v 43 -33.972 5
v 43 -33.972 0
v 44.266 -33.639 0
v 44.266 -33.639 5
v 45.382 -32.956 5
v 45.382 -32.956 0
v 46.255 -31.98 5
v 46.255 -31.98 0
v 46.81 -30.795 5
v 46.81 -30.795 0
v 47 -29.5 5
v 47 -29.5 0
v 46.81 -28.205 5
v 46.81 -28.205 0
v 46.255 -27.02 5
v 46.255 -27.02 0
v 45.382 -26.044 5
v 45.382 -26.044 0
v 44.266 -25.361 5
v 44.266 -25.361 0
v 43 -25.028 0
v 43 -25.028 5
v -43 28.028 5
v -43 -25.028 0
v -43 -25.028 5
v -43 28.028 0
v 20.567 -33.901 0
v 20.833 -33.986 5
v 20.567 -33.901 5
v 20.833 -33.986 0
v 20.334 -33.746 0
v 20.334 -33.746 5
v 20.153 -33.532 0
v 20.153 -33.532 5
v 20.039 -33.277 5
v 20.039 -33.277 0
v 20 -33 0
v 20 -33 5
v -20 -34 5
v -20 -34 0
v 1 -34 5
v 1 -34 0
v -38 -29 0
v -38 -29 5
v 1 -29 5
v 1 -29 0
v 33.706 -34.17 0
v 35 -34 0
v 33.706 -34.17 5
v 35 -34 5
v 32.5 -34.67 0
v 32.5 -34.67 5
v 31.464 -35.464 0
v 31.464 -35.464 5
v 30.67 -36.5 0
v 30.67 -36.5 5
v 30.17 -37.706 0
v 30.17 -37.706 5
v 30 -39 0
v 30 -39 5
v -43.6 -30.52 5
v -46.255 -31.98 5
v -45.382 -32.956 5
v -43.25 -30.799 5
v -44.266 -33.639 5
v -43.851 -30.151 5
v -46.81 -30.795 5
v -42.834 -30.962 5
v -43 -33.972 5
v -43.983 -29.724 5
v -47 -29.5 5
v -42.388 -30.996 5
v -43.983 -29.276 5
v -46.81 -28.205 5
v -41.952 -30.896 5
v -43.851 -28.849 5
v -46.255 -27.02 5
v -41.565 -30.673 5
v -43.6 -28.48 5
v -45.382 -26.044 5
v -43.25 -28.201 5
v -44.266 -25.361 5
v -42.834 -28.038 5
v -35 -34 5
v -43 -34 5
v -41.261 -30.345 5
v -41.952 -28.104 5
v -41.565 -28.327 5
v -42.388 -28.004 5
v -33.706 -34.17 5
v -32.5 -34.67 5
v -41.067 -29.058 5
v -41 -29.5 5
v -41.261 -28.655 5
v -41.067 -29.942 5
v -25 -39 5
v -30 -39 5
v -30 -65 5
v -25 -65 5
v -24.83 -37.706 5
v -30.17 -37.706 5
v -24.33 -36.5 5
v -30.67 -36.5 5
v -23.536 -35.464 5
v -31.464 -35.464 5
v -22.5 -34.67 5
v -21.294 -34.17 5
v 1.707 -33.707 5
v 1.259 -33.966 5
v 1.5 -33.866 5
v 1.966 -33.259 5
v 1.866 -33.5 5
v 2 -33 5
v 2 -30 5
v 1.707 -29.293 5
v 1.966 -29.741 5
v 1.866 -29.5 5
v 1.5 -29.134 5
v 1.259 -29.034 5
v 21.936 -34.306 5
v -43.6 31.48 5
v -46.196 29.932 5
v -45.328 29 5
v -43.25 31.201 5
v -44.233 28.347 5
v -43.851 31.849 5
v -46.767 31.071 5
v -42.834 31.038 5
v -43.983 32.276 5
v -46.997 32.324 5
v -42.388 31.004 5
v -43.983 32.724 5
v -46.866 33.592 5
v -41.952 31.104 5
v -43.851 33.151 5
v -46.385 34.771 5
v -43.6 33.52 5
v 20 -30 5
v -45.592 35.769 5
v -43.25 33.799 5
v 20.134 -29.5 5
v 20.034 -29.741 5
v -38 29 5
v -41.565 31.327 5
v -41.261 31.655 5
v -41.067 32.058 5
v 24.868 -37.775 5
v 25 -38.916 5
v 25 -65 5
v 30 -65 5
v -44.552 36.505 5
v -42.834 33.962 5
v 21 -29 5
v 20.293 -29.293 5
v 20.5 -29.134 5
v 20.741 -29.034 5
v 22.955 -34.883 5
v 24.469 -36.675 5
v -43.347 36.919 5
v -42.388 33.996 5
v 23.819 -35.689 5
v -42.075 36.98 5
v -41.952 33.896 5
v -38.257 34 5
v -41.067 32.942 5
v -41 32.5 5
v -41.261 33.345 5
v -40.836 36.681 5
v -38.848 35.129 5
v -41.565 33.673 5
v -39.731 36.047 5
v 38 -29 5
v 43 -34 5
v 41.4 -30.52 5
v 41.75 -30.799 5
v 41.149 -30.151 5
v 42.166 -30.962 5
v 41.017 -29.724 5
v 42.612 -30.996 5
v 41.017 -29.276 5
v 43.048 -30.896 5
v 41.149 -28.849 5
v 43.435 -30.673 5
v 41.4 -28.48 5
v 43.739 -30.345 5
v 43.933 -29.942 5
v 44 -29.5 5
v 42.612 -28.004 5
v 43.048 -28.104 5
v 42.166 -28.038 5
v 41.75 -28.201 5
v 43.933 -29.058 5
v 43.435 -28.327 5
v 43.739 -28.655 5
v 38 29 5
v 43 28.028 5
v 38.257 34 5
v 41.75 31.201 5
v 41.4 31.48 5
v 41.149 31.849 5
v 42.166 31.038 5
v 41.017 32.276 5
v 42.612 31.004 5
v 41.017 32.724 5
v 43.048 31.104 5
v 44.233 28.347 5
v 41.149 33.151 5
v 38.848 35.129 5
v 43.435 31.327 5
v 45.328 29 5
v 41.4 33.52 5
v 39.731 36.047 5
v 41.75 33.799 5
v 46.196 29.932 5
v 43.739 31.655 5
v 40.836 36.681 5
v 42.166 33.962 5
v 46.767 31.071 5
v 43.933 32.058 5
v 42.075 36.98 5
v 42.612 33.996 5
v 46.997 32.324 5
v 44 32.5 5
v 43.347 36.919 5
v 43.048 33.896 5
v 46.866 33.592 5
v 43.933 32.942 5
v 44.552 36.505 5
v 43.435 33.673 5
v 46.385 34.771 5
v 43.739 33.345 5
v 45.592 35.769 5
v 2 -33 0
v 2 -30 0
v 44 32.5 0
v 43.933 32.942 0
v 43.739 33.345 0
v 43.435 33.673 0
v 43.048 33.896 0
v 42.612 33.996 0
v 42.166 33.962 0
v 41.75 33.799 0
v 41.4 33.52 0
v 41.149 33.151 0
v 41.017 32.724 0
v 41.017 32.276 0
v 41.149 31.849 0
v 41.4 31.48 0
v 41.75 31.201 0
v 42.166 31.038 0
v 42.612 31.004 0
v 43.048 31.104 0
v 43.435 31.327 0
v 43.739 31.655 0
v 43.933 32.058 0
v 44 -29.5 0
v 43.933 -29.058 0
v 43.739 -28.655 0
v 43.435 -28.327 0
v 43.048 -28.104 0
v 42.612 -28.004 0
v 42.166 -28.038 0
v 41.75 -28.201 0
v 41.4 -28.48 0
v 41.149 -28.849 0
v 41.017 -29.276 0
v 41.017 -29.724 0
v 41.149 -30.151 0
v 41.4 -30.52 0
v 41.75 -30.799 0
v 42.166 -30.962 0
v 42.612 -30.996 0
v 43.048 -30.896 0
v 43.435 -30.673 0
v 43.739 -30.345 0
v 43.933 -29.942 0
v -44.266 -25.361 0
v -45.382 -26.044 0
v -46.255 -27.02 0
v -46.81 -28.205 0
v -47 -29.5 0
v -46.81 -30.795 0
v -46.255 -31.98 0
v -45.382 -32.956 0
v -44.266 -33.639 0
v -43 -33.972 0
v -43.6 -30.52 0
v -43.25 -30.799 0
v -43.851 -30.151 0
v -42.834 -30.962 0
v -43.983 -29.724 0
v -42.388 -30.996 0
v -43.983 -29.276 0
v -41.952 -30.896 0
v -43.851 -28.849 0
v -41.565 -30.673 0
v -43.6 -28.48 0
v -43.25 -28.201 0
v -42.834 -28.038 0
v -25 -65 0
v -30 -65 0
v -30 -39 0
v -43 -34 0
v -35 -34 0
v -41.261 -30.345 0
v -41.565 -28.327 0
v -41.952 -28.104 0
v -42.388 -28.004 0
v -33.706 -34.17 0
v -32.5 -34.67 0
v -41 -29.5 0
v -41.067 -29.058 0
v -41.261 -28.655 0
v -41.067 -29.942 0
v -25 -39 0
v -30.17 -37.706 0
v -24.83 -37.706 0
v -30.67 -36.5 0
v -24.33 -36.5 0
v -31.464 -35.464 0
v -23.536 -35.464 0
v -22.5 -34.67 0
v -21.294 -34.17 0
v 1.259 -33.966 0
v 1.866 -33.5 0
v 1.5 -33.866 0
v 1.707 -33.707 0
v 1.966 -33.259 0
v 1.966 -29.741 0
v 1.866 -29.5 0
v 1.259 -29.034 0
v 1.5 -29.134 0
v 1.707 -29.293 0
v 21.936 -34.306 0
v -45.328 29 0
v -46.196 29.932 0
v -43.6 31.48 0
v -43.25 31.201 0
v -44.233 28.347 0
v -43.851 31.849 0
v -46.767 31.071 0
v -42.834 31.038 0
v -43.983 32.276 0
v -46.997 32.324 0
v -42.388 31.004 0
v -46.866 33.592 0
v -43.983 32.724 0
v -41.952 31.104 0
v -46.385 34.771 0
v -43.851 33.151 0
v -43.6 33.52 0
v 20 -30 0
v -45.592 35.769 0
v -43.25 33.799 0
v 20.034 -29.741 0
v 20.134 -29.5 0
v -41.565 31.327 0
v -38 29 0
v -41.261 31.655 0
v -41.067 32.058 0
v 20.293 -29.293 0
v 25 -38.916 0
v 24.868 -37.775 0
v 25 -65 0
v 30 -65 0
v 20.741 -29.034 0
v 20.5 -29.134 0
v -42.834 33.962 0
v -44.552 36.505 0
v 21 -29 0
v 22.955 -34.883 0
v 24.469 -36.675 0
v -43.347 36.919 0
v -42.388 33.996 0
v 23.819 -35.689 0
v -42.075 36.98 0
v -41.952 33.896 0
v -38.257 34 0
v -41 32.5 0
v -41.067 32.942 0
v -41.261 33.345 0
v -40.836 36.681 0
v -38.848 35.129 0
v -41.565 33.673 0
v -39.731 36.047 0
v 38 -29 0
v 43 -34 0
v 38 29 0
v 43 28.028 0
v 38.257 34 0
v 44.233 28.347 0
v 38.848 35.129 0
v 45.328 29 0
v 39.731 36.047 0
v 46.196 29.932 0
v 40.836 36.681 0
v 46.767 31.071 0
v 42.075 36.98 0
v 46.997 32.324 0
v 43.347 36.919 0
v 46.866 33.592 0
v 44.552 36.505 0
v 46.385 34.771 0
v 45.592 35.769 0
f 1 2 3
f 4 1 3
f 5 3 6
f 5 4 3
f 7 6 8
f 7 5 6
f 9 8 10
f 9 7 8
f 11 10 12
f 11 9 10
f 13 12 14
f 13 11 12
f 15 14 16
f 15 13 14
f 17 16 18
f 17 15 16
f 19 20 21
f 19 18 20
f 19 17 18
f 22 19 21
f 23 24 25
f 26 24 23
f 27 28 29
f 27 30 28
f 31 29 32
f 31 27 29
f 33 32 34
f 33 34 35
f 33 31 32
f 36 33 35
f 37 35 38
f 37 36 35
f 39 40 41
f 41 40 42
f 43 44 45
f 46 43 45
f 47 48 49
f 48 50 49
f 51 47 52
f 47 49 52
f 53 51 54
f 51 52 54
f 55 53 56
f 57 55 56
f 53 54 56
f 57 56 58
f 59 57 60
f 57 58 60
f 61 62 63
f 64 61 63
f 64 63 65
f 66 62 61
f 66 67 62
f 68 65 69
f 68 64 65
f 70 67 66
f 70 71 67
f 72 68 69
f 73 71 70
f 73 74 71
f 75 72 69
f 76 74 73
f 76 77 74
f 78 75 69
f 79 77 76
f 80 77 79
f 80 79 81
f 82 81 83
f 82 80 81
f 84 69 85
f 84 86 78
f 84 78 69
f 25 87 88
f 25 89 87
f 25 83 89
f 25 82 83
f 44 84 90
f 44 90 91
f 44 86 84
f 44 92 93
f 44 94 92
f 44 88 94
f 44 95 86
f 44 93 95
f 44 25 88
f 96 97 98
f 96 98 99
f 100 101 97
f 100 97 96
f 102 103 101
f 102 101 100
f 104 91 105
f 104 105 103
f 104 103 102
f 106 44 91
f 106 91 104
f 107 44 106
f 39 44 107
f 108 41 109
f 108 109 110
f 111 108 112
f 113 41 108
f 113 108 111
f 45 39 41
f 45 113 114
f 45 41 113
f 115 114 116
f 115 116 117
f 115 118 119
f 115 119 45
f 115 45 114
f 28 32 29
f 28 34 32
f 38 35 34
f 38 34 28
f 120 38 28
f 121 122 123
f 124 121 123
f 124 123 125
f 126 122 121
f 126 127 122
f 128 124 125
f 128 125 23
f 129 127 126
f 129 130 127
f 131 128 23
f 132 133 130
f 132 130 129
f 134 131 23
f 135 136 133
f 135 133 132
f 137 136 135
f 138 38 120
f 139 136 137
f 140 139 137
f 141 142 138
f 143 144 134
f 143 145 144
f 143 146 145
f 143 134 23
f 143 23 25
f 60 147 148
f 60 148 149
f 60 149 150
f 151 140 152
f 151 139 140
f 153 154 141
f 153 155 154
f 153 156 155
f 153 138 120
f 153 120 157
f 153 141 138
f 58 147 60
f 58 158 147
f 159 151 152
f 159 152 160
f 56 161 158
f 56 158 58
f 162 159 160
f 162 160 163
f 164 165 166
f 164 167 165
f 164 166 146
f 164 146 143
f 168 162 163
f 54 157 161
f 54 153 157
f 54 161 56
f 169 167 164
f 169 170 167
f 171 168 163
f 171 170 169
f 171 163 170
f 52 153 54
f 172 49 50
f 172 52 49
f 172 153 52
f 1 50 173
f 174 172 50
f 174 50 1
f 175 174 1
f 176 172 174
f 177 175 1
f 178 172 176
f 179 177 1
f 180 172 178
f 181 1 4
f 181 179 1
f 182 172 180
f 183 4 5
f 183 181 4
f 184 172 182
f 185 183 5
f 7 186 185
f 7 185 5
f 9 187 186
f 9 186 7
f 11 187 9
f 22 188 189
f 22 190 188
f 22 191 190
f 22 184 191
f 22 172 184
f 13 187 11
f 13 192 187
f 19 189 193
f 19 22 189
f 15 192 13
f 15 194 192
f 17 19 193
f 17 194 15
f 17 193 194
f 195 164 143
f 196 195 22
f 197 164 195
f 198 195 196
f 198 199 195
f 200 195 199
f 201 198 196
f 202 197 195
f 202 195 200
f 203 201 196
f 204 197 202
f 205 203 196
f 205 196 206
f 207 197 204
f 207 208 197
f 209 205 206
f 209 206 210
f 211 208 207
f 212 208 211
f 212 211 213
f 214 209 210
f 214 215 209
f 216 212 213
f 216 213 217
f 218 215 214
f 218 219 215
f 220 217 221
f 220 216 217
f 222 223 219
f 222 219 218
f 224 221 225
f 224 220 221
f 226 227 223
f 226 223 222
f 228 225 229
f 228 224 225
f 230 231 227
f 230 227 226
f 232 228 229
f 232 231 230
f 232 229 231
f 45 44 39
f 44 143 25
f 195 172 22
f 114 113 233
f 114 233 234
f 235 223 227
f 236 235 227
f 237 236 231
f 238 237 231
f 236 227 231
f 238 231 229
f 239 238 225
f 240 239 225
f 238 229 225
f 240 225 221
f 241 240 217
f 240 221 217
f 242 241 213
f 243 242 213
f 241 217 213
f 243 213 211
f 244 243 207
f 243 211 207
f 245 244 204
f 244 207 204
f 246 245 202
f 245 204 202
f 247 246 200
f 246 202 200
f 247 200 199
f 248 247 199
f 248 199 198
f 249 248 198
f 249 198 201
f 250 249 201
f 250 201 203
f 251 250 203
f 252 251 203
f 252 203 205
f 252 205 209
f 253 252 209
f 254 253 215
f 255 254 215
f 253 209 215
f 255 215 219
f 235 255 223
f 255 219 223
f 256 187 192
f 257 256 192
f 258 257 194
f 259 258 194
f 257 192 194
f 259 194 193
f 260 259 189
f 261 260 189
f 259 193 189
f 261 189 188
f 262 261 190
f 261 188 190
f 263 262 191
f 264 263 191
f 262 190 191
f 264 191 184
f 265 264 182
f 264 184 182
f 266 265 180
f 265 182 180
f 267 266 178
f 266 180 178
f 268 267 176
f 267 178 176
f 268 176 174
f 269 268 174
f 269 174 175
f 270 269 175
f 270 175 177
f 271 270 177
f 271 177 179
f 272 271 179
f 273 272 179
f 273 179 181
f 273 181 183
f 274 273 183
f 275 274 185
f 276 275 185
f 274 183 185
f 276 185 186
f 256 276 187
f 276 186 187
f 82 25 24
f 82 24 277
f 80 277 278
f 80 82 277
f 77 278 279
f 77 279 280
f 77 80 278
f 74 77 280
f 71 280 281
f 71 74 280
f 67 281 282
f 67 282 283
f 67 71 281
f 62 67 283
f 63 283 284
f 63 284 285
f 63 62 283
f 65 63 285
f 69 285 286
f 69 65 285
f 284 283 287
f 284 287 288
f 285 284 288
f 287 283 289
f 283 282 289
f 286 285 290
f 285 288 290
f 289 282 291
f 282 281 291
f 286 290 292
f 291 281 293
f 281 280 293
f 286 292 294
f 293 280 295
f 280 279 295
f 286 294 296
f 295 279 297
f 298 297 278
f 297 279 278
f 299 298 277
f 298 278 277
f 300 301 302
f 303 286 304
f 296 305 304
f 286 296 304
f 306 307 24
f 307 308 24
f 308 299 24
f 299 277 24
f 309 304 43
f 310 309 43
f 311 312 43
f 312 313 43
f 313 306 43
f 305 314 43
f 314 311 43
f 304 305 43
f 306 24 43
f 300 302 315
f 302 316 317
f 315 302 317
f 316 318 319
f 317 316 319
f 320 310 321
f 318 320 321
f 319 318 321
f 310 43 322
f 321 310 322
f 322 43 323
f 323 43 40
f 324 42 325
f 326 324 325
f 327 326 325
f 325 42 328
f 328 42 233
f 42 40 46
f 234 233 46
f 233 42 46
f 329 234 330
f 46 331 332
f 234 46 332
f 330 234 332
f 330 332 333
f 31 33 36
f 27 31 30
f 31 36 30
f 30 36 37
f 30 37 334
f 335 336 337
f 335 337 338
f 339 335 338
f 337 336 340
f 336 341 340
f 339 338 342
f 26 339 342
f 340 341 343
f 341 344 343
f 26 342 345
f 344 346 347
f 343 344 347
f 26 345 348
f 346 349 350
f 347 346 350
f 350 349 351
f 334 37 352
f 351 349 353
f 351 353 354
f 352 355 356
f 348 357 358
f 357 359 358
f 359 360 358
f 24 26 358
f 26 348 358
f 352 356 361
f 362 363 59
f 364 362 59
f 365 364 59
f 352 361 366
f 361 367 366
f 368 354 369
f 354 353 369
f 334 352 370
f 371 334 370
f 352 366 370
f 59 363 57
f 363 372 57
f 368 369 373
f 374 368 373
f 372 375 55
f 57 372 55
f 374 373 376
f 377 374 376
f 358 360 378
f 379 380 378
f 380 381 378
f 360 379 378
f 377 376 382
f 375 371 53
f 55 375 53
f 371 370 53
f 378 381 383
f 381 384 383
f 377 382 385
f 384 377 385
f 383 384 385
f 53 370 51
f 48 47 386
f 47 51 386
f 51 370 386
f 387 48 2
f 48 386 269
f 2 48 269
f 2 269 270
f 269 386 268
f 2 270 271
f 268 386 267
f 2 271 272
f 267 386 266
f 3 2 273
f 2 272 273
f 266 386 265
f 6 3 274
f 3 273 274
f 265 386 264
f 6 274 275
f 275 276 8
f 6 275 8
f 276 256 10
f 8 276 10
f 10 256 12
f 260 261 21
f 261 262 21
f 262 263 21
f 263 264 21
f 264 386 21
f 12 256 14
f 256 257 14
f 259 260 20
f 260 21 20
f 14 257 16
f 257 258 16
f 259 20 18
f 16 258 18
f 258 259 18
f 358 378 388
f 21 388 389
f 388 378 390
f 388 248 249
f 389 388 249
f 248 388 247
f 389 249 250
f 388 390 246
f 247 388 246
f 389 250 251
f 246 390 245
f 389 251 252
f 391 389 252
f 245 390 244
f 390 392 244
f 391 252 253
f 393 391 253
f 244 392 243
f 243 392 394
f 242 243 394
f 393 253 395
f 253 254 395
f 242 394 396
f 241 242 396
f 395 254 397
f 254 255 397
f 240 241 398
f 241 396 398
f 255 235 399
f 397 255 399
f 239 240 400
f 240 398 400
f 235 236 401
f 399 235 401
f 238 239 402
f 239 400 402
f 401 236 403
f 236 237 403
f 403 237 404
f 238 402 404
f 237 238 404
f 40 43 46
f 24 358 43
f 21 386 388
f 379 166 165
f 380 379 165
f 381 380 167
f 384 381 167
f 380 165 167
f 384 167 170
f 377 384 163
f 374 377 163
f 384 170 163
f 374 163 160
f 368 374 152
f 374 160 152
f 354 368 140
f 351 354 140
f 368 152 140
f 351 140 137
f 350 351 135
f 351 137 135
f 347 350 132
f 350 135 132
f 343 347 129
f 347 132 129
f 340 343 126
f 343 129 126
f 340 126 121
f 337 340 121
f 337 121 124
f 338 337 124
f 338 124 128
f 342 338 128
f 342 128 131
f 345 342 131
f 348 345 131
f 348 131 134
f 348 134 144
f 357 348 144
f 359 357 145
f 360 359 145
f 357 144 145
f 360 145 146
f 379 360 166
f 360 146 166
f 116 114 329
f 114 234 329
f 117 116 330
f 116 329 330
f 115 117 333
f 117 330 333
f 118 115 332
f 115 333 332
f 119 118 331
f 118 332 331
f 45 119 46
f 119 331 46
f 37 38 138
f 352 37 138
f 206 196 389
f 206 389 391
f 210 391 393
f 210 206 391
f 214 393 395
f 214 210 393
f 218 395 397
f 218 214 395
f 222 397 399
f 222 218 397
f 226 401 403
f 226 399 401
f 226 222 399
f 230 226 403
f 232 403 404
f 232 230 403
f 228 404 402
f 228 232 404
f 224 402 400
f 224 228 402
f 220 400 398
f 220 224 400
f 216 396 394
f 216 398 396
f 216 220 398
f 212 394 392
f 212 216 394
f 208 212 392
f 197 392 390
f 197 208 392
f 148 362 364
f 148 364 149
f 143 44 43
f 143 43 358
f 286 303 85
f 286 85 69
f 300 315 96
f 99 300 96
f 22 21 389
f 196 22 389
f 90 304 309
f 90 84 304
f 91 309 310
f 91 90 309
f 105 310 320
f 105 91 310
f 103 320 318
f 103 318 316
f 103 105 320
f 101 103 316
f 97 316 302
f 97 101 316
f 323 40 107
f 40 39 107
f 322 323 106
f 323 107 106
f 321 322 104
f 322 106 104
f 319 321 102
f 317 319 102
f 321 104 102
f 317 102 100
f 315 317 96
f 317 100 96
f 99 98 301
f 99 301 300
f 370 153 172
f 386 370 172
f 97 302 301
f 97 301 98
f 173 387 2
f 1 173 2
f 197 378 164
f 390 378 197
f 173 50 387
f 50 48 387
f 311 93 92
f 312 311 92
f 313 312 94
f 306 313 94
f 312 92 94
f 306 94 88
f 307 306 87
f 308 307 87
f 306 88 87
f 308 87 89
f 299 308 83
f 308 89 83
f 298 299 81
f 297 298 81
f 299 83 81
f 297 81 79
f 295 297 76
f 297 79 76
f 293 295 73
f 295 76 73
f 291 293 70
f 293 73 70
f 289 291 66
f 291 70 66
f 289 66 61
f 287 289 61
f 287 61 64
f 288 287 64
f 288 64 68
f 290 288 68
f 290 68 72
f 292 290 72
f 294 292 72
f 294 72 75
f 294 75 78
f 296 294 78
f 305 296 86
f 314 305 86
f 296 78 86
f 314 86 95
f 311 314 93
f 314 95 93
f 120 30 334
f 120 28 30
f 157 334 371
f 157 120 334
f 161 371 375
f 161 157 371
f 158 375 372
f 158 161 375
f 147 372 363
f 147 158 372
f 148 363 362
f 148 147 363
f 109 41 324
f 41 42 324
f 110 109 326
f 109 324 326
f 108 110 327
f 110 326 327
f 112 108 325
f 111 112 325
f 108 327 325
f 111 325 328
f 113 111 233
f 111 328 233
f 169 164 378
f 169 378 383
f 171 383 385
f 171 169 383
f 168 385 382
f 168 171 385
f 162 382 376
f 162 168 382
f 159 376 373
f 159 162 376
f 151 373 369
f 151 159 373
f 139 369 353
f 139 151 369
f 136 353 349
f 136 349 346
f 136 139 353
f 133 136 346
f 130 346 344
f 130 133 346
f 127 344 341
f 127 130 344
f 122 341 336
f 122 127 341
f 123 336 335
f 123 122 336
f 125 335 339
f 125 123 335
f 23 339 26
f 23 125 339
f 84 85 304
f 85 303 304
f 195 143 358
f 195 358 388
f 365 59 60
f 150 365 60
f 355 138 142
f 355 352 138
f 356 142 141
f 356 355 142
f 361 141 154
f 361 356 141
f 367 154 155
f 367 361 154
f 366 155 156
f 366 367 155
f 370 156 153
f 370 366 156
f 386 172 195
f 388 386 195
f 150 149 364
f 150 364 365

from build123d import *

# Parameters (mm, degrees)
F0_W      = 86
F0_H      = 68
F1_DEPTH  = 5
F2_W      = 76
F2_H      = 58
F3_DEPTH  = 5
F4_W      = 18
F4_H      = 5
F5_DEPTH  = 5
F6_R      = 4.5
F7_DEPTH  = 5
F8_R      = 1.5
F9_DEPTH  = 5
F10_R     = 1
F11_W     = 5
F11_H     = 5
F12_DEPTH = 31
F13_R     = 5


with BuildPart() as f1:
    # F0 (on Top) → F1 (new body)
    with BuildSketch(Plane.XY):
        Rectangle(F0_W, F0_H)
    extrude(amount=F1_DEPTH)

    # F2 (on face) → F3 (cut, through all)
    with BuildSketch(Plane.XY.offset(5)):
        Rectangle(F2_W, F2_H)
    extrude(amount=-F3_DEPTH, mode=Mode.SUBTRACT)

    # F4 (on face) → F5 (cut, through all)
    with BuildSketch(Plane.XY.offset(5)):
        with Locations((11, -31.5)):
            Rectangle(F4_W, F4_H)
    extrude(amount=-F5_DEPTH, mode=Mode.SUBTRACT)

    # F6 (on face) → F7 (join)
    with BuildSketch(Plane.XY.offset(5)):
        with Locations((-42.5, 32.5)):
            Circle(F6_R)
        with Locations((42.5, 32.5)):
            Circle(F6_R)
        with Locations((-42.5, -29.5)):
            Circle(F6_R)
        with Locations((42.5, -29.5)):
            Circle(F6_R)
    extrude(amount=-F7_DEPTH)

    # F8 (on face) → F9 (cut, through all)
    with BuildSketch(Plane.XY.offset(5)):
        with Locations((-42.5, 32.5)):
            Circle(F8_R)
        with Locations((-42.5, -29.5)):
            Circle(F8_R)
        with Locations((42.5, -29.5)):
            Circle(F8_R)
        with Locations((42.5, 32.5)):
            Circle(F8_R)
    extrude(amount=-F9_DEPTH, mode=Mode.SUBTRACT)

    # F10
    f10_edges = [f1.edges().sort_by_distance(p)[0] for p in [
        (20, -29, 2.5),
        (20, -34, 2.5),
        (2, -29, 2.5),
        (2, -34, 2.5),
    ]]
    fillet(f10_edges, radius=F10_R)

    # F11 (on face) → F12 (join)
    with BuildSketch(Plane.XZ.offset(34)):
        with Locations((-27.5, 2.5)):
            Rectangle(F11_W, F11_H)
        with Locations((27.5, 2.5)):
            Rectangle(F11_W, F11_H)
    extrude(amount=F12_DEPTH)

    # F13
    f13_edges = [f1.edges().sort_by_distance(p)[0] for p in [
        (25, -34, 2.5),
        (-25, -34, 2.5),
        (30, -34, 2.5),
        (-30, -34, 2.5),
    ]]
    fillet(f13_edges, radius=F13_R)


solid = f1.part
